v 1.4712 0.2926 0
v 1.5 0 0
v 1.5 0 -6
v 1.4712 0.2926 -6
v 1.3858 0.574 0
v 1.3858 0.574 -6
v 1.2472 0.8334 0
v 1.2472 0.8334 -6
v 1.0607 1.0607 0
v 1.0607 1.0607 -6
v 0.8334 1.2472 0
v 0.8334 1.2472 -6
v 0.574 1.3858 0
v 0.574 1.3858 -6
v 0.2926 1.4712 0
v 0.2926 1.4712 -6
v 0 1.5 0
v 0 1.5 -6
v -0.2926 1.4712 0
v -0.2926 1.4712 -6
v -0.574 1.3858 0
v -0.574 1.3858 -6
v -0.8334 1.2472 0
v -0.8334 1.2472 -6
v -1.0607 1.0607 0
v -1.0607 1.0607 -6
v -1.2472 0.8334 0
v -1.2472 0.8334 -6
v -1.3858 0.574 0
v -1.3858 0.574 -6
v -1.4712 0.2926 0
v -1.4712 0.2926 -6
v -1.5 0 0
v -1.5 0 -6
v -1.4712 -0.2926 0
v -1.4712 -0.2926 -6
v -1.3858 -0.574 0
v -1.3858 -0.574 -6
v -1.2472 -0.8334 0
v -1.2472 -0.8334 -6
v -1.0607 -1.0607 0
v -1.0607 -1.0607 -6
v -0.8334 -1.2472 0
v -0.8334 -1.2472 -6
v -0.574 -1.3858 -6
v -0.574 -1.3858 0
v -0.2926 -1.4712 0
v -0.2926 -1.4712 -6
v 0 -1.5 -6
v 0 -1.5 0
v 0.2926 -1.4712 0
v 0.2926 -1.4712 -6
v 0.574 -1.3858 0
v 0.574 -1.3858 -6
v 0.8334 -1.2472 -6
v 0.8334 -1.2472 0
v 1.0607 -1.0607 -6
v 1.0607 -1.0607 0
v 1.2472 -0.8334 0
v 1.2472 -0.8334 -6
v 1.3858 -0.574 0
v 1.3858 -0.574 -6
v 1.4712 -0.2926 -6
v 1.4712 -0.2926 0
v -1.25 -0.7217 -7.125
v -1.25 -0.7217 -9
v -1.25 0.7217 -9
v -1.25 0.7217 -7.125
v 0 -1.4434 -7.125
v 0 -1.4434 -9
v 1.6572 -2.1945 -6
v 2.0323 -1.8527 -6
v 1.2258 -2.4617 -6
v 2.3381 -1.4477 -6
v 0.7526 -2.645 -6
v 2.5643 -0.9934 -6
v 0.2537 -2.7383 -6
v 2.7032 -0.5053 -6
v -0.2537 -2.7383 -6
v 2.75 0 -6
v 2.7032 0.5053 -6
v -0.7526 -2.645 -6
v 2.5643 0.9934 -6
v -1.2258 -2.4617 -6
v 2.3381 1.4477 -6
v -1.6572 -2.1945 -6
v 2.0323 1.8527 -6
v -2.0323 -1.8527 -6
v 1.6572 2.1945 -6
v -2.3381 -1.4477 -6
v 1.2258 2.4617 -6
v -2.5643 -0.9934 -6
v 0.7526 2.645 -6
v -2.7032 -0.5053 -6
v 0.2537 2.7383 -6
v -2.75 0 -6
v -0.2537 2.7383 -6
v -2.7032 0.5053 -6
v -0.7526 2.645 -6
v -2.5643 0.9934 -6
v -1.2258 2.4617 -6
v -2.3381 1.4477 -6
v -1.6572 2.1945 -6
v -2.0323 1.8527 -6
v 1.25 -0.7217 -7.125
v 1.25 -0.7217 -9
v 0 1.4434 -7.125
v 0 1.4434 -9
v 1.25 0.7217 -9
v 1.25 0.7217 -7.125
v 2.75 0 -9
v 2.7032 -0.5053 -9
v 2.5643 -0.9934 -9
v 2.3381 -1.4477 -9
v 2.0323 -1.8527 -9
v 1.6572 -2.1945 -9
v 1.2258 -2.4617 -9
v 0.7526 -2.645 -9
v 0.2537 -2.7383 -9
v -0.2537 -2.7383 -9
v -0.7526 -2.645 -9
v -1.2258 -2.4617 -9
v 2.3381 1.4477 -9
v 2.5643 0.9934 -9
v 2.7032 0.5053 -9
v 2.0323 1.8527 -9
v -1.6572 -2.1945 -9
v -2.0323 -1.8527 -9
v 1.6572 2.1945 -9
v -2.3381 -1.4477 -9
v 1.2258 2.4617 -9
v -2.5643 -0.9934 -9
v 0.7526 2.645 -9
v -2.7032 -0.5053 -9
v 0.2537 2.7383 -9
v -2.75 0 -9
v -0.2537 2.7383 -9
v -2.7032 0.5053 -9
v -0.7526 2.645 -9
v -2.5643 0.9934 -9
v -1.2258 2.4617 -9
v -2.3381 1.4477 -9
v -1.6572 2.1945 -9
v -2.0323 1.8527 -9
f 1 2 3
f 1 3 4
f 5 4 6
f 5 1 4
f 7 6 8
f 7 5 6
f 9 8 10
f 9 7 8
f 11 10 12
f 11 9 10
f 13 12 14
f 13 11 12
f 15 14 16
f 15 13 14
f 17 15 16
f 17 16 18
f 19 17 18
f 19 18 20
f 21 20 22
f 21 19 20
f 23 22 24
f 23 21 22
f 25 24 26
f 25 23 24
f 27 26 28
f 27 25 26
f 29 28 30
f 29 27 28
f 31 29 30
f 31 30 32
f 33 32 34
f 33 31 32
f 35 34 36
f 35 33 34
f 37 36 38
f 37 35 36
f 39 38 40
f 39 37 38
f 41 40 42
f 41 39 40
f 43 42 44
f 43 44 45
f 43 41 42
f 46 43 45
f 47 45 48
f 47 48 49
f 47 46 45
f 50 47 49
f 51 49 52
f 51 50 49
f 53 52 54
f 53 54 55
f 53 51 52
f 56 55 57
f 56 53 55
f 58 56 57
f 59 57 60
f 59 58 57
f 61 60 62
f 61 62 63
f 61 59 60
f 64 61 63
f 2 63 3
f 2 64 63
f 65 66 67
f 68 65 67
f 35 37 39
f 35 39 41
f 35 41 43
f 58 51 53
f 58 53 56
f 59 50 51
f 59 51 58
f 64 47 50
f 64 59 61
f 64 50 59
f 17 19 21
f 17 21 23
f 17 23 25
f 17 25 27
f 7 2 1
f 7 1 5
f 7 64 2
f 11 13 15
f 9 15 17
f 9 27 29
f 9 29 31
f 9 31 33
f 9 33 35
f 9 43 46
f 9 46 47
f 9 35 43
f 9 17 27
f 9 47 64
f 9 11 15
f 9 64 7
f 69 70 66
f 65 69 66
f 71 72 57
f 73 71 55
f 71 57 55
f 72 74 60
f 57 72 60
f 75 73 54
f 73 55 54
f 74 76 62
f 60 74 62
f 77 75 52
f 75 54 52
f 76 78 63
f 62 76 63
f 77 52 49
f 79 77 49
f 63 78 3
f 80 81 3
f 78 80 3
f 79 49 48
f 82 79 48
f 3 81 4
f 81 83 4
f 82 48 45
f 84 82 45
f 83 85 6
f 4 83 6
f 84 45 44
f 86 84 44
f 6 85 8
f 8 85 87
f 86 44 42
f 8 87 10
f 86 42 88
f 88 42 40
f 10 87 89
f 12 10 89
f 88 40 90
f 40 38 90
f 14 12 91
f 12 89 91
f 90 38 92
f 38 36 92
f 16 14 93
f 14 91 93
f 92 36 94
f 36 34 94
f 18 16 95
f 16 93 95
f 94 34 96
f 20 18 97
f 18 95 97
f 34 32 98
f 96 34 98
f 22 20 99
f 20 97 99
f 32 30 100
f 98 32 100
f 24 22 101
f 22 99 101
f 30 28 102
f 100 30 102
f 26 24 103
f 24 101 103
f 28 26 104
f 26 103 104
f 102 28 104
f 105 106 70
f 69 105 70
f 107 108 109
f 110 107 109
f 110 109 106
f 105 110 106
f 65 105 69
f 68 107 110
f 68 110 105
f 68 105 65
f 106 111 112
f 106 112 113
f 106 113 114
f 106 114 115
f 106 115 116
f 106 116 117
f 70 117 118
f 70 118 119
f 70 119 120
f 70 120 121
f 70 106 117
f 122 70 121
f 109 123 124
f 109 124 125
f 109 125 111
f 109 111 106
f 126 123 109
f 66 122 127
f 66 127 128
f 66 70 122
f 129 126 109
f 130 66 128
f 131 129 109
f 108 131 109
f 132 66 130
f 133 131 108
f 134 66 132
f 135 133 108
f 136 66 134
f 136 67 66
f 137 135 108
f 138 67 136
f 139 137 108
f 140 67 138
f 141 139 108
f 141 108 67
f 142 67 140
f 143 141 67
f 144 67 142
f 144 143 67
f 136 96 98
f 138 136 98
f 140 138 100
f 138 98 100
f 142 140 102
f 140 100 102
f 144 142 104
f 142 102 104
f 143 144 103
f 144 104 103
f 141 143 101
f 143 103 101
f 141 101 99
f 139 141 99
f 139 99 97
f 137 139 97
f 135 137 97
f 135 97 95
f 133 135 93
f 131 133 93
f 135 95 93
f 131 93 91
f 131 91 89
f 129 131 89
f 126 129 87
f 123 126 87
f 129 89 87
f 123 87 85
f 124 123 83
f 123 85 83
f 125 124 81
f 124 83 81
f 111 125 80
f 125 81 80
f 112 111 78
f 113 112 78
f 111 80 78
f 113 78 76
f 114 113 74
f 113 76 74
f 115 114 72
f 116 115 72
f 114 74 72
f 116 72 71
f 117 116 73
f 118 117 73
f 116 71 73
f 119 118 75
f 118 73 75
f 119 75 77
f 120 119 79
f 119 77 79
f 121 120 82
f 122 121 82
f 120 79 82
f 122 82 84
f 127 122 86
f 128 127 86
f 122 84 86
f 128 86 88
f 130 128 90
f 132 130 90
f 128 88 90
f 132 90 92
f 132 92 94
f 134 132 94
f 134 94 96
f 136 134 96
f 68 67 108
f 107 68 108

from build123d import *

# Parameters (mm, degrees)
SKETCH1_R          = 1.5
EXTRUDE1_DEPTH     = 6
SKETCH6_R          = 2.75
EXTRUDE2_DEPTH     = 3
CUT_EXTRUDE1_DEPTH = 1.875


with BuildPart() as part:
    # Sketch1 → Extrude1 (new body)
    with BuildSketch(Plane.XY):
        Circle(SKETCH1_R)
    extrude(amount=-EXTRUDE1_DEPTH)

    # Sketch6 → Extrude2 (add)
    with BuildSketch(Plane(origin=(0, 0, -6), x_dir=(-1, 0, 0), z_dir=(0, 0, -1))):
        Circle(SKETCH6_R)
    extrude(amount=EXTRUDE2_DEPTH)

    # Sketch7 → Cut-Extrude1 (cut)
    with BuildSketch(Plane(origin=(0, 0, -9), x_dir=(-1, 0, 0), z_dir=(0, 0, -1))):
        Polygon((0, 1.443375673), (-1.25, 0.721687836), (-1.25, -0.721687836), (0, -1.443375673), (1.25, -0.721687836), (1.25, 0.721687836), align=None)
    extrude(amount=-CUT_EXTRUDE1_DEPTH, mode=Mode.SUBTRACT)


solid = part.part
